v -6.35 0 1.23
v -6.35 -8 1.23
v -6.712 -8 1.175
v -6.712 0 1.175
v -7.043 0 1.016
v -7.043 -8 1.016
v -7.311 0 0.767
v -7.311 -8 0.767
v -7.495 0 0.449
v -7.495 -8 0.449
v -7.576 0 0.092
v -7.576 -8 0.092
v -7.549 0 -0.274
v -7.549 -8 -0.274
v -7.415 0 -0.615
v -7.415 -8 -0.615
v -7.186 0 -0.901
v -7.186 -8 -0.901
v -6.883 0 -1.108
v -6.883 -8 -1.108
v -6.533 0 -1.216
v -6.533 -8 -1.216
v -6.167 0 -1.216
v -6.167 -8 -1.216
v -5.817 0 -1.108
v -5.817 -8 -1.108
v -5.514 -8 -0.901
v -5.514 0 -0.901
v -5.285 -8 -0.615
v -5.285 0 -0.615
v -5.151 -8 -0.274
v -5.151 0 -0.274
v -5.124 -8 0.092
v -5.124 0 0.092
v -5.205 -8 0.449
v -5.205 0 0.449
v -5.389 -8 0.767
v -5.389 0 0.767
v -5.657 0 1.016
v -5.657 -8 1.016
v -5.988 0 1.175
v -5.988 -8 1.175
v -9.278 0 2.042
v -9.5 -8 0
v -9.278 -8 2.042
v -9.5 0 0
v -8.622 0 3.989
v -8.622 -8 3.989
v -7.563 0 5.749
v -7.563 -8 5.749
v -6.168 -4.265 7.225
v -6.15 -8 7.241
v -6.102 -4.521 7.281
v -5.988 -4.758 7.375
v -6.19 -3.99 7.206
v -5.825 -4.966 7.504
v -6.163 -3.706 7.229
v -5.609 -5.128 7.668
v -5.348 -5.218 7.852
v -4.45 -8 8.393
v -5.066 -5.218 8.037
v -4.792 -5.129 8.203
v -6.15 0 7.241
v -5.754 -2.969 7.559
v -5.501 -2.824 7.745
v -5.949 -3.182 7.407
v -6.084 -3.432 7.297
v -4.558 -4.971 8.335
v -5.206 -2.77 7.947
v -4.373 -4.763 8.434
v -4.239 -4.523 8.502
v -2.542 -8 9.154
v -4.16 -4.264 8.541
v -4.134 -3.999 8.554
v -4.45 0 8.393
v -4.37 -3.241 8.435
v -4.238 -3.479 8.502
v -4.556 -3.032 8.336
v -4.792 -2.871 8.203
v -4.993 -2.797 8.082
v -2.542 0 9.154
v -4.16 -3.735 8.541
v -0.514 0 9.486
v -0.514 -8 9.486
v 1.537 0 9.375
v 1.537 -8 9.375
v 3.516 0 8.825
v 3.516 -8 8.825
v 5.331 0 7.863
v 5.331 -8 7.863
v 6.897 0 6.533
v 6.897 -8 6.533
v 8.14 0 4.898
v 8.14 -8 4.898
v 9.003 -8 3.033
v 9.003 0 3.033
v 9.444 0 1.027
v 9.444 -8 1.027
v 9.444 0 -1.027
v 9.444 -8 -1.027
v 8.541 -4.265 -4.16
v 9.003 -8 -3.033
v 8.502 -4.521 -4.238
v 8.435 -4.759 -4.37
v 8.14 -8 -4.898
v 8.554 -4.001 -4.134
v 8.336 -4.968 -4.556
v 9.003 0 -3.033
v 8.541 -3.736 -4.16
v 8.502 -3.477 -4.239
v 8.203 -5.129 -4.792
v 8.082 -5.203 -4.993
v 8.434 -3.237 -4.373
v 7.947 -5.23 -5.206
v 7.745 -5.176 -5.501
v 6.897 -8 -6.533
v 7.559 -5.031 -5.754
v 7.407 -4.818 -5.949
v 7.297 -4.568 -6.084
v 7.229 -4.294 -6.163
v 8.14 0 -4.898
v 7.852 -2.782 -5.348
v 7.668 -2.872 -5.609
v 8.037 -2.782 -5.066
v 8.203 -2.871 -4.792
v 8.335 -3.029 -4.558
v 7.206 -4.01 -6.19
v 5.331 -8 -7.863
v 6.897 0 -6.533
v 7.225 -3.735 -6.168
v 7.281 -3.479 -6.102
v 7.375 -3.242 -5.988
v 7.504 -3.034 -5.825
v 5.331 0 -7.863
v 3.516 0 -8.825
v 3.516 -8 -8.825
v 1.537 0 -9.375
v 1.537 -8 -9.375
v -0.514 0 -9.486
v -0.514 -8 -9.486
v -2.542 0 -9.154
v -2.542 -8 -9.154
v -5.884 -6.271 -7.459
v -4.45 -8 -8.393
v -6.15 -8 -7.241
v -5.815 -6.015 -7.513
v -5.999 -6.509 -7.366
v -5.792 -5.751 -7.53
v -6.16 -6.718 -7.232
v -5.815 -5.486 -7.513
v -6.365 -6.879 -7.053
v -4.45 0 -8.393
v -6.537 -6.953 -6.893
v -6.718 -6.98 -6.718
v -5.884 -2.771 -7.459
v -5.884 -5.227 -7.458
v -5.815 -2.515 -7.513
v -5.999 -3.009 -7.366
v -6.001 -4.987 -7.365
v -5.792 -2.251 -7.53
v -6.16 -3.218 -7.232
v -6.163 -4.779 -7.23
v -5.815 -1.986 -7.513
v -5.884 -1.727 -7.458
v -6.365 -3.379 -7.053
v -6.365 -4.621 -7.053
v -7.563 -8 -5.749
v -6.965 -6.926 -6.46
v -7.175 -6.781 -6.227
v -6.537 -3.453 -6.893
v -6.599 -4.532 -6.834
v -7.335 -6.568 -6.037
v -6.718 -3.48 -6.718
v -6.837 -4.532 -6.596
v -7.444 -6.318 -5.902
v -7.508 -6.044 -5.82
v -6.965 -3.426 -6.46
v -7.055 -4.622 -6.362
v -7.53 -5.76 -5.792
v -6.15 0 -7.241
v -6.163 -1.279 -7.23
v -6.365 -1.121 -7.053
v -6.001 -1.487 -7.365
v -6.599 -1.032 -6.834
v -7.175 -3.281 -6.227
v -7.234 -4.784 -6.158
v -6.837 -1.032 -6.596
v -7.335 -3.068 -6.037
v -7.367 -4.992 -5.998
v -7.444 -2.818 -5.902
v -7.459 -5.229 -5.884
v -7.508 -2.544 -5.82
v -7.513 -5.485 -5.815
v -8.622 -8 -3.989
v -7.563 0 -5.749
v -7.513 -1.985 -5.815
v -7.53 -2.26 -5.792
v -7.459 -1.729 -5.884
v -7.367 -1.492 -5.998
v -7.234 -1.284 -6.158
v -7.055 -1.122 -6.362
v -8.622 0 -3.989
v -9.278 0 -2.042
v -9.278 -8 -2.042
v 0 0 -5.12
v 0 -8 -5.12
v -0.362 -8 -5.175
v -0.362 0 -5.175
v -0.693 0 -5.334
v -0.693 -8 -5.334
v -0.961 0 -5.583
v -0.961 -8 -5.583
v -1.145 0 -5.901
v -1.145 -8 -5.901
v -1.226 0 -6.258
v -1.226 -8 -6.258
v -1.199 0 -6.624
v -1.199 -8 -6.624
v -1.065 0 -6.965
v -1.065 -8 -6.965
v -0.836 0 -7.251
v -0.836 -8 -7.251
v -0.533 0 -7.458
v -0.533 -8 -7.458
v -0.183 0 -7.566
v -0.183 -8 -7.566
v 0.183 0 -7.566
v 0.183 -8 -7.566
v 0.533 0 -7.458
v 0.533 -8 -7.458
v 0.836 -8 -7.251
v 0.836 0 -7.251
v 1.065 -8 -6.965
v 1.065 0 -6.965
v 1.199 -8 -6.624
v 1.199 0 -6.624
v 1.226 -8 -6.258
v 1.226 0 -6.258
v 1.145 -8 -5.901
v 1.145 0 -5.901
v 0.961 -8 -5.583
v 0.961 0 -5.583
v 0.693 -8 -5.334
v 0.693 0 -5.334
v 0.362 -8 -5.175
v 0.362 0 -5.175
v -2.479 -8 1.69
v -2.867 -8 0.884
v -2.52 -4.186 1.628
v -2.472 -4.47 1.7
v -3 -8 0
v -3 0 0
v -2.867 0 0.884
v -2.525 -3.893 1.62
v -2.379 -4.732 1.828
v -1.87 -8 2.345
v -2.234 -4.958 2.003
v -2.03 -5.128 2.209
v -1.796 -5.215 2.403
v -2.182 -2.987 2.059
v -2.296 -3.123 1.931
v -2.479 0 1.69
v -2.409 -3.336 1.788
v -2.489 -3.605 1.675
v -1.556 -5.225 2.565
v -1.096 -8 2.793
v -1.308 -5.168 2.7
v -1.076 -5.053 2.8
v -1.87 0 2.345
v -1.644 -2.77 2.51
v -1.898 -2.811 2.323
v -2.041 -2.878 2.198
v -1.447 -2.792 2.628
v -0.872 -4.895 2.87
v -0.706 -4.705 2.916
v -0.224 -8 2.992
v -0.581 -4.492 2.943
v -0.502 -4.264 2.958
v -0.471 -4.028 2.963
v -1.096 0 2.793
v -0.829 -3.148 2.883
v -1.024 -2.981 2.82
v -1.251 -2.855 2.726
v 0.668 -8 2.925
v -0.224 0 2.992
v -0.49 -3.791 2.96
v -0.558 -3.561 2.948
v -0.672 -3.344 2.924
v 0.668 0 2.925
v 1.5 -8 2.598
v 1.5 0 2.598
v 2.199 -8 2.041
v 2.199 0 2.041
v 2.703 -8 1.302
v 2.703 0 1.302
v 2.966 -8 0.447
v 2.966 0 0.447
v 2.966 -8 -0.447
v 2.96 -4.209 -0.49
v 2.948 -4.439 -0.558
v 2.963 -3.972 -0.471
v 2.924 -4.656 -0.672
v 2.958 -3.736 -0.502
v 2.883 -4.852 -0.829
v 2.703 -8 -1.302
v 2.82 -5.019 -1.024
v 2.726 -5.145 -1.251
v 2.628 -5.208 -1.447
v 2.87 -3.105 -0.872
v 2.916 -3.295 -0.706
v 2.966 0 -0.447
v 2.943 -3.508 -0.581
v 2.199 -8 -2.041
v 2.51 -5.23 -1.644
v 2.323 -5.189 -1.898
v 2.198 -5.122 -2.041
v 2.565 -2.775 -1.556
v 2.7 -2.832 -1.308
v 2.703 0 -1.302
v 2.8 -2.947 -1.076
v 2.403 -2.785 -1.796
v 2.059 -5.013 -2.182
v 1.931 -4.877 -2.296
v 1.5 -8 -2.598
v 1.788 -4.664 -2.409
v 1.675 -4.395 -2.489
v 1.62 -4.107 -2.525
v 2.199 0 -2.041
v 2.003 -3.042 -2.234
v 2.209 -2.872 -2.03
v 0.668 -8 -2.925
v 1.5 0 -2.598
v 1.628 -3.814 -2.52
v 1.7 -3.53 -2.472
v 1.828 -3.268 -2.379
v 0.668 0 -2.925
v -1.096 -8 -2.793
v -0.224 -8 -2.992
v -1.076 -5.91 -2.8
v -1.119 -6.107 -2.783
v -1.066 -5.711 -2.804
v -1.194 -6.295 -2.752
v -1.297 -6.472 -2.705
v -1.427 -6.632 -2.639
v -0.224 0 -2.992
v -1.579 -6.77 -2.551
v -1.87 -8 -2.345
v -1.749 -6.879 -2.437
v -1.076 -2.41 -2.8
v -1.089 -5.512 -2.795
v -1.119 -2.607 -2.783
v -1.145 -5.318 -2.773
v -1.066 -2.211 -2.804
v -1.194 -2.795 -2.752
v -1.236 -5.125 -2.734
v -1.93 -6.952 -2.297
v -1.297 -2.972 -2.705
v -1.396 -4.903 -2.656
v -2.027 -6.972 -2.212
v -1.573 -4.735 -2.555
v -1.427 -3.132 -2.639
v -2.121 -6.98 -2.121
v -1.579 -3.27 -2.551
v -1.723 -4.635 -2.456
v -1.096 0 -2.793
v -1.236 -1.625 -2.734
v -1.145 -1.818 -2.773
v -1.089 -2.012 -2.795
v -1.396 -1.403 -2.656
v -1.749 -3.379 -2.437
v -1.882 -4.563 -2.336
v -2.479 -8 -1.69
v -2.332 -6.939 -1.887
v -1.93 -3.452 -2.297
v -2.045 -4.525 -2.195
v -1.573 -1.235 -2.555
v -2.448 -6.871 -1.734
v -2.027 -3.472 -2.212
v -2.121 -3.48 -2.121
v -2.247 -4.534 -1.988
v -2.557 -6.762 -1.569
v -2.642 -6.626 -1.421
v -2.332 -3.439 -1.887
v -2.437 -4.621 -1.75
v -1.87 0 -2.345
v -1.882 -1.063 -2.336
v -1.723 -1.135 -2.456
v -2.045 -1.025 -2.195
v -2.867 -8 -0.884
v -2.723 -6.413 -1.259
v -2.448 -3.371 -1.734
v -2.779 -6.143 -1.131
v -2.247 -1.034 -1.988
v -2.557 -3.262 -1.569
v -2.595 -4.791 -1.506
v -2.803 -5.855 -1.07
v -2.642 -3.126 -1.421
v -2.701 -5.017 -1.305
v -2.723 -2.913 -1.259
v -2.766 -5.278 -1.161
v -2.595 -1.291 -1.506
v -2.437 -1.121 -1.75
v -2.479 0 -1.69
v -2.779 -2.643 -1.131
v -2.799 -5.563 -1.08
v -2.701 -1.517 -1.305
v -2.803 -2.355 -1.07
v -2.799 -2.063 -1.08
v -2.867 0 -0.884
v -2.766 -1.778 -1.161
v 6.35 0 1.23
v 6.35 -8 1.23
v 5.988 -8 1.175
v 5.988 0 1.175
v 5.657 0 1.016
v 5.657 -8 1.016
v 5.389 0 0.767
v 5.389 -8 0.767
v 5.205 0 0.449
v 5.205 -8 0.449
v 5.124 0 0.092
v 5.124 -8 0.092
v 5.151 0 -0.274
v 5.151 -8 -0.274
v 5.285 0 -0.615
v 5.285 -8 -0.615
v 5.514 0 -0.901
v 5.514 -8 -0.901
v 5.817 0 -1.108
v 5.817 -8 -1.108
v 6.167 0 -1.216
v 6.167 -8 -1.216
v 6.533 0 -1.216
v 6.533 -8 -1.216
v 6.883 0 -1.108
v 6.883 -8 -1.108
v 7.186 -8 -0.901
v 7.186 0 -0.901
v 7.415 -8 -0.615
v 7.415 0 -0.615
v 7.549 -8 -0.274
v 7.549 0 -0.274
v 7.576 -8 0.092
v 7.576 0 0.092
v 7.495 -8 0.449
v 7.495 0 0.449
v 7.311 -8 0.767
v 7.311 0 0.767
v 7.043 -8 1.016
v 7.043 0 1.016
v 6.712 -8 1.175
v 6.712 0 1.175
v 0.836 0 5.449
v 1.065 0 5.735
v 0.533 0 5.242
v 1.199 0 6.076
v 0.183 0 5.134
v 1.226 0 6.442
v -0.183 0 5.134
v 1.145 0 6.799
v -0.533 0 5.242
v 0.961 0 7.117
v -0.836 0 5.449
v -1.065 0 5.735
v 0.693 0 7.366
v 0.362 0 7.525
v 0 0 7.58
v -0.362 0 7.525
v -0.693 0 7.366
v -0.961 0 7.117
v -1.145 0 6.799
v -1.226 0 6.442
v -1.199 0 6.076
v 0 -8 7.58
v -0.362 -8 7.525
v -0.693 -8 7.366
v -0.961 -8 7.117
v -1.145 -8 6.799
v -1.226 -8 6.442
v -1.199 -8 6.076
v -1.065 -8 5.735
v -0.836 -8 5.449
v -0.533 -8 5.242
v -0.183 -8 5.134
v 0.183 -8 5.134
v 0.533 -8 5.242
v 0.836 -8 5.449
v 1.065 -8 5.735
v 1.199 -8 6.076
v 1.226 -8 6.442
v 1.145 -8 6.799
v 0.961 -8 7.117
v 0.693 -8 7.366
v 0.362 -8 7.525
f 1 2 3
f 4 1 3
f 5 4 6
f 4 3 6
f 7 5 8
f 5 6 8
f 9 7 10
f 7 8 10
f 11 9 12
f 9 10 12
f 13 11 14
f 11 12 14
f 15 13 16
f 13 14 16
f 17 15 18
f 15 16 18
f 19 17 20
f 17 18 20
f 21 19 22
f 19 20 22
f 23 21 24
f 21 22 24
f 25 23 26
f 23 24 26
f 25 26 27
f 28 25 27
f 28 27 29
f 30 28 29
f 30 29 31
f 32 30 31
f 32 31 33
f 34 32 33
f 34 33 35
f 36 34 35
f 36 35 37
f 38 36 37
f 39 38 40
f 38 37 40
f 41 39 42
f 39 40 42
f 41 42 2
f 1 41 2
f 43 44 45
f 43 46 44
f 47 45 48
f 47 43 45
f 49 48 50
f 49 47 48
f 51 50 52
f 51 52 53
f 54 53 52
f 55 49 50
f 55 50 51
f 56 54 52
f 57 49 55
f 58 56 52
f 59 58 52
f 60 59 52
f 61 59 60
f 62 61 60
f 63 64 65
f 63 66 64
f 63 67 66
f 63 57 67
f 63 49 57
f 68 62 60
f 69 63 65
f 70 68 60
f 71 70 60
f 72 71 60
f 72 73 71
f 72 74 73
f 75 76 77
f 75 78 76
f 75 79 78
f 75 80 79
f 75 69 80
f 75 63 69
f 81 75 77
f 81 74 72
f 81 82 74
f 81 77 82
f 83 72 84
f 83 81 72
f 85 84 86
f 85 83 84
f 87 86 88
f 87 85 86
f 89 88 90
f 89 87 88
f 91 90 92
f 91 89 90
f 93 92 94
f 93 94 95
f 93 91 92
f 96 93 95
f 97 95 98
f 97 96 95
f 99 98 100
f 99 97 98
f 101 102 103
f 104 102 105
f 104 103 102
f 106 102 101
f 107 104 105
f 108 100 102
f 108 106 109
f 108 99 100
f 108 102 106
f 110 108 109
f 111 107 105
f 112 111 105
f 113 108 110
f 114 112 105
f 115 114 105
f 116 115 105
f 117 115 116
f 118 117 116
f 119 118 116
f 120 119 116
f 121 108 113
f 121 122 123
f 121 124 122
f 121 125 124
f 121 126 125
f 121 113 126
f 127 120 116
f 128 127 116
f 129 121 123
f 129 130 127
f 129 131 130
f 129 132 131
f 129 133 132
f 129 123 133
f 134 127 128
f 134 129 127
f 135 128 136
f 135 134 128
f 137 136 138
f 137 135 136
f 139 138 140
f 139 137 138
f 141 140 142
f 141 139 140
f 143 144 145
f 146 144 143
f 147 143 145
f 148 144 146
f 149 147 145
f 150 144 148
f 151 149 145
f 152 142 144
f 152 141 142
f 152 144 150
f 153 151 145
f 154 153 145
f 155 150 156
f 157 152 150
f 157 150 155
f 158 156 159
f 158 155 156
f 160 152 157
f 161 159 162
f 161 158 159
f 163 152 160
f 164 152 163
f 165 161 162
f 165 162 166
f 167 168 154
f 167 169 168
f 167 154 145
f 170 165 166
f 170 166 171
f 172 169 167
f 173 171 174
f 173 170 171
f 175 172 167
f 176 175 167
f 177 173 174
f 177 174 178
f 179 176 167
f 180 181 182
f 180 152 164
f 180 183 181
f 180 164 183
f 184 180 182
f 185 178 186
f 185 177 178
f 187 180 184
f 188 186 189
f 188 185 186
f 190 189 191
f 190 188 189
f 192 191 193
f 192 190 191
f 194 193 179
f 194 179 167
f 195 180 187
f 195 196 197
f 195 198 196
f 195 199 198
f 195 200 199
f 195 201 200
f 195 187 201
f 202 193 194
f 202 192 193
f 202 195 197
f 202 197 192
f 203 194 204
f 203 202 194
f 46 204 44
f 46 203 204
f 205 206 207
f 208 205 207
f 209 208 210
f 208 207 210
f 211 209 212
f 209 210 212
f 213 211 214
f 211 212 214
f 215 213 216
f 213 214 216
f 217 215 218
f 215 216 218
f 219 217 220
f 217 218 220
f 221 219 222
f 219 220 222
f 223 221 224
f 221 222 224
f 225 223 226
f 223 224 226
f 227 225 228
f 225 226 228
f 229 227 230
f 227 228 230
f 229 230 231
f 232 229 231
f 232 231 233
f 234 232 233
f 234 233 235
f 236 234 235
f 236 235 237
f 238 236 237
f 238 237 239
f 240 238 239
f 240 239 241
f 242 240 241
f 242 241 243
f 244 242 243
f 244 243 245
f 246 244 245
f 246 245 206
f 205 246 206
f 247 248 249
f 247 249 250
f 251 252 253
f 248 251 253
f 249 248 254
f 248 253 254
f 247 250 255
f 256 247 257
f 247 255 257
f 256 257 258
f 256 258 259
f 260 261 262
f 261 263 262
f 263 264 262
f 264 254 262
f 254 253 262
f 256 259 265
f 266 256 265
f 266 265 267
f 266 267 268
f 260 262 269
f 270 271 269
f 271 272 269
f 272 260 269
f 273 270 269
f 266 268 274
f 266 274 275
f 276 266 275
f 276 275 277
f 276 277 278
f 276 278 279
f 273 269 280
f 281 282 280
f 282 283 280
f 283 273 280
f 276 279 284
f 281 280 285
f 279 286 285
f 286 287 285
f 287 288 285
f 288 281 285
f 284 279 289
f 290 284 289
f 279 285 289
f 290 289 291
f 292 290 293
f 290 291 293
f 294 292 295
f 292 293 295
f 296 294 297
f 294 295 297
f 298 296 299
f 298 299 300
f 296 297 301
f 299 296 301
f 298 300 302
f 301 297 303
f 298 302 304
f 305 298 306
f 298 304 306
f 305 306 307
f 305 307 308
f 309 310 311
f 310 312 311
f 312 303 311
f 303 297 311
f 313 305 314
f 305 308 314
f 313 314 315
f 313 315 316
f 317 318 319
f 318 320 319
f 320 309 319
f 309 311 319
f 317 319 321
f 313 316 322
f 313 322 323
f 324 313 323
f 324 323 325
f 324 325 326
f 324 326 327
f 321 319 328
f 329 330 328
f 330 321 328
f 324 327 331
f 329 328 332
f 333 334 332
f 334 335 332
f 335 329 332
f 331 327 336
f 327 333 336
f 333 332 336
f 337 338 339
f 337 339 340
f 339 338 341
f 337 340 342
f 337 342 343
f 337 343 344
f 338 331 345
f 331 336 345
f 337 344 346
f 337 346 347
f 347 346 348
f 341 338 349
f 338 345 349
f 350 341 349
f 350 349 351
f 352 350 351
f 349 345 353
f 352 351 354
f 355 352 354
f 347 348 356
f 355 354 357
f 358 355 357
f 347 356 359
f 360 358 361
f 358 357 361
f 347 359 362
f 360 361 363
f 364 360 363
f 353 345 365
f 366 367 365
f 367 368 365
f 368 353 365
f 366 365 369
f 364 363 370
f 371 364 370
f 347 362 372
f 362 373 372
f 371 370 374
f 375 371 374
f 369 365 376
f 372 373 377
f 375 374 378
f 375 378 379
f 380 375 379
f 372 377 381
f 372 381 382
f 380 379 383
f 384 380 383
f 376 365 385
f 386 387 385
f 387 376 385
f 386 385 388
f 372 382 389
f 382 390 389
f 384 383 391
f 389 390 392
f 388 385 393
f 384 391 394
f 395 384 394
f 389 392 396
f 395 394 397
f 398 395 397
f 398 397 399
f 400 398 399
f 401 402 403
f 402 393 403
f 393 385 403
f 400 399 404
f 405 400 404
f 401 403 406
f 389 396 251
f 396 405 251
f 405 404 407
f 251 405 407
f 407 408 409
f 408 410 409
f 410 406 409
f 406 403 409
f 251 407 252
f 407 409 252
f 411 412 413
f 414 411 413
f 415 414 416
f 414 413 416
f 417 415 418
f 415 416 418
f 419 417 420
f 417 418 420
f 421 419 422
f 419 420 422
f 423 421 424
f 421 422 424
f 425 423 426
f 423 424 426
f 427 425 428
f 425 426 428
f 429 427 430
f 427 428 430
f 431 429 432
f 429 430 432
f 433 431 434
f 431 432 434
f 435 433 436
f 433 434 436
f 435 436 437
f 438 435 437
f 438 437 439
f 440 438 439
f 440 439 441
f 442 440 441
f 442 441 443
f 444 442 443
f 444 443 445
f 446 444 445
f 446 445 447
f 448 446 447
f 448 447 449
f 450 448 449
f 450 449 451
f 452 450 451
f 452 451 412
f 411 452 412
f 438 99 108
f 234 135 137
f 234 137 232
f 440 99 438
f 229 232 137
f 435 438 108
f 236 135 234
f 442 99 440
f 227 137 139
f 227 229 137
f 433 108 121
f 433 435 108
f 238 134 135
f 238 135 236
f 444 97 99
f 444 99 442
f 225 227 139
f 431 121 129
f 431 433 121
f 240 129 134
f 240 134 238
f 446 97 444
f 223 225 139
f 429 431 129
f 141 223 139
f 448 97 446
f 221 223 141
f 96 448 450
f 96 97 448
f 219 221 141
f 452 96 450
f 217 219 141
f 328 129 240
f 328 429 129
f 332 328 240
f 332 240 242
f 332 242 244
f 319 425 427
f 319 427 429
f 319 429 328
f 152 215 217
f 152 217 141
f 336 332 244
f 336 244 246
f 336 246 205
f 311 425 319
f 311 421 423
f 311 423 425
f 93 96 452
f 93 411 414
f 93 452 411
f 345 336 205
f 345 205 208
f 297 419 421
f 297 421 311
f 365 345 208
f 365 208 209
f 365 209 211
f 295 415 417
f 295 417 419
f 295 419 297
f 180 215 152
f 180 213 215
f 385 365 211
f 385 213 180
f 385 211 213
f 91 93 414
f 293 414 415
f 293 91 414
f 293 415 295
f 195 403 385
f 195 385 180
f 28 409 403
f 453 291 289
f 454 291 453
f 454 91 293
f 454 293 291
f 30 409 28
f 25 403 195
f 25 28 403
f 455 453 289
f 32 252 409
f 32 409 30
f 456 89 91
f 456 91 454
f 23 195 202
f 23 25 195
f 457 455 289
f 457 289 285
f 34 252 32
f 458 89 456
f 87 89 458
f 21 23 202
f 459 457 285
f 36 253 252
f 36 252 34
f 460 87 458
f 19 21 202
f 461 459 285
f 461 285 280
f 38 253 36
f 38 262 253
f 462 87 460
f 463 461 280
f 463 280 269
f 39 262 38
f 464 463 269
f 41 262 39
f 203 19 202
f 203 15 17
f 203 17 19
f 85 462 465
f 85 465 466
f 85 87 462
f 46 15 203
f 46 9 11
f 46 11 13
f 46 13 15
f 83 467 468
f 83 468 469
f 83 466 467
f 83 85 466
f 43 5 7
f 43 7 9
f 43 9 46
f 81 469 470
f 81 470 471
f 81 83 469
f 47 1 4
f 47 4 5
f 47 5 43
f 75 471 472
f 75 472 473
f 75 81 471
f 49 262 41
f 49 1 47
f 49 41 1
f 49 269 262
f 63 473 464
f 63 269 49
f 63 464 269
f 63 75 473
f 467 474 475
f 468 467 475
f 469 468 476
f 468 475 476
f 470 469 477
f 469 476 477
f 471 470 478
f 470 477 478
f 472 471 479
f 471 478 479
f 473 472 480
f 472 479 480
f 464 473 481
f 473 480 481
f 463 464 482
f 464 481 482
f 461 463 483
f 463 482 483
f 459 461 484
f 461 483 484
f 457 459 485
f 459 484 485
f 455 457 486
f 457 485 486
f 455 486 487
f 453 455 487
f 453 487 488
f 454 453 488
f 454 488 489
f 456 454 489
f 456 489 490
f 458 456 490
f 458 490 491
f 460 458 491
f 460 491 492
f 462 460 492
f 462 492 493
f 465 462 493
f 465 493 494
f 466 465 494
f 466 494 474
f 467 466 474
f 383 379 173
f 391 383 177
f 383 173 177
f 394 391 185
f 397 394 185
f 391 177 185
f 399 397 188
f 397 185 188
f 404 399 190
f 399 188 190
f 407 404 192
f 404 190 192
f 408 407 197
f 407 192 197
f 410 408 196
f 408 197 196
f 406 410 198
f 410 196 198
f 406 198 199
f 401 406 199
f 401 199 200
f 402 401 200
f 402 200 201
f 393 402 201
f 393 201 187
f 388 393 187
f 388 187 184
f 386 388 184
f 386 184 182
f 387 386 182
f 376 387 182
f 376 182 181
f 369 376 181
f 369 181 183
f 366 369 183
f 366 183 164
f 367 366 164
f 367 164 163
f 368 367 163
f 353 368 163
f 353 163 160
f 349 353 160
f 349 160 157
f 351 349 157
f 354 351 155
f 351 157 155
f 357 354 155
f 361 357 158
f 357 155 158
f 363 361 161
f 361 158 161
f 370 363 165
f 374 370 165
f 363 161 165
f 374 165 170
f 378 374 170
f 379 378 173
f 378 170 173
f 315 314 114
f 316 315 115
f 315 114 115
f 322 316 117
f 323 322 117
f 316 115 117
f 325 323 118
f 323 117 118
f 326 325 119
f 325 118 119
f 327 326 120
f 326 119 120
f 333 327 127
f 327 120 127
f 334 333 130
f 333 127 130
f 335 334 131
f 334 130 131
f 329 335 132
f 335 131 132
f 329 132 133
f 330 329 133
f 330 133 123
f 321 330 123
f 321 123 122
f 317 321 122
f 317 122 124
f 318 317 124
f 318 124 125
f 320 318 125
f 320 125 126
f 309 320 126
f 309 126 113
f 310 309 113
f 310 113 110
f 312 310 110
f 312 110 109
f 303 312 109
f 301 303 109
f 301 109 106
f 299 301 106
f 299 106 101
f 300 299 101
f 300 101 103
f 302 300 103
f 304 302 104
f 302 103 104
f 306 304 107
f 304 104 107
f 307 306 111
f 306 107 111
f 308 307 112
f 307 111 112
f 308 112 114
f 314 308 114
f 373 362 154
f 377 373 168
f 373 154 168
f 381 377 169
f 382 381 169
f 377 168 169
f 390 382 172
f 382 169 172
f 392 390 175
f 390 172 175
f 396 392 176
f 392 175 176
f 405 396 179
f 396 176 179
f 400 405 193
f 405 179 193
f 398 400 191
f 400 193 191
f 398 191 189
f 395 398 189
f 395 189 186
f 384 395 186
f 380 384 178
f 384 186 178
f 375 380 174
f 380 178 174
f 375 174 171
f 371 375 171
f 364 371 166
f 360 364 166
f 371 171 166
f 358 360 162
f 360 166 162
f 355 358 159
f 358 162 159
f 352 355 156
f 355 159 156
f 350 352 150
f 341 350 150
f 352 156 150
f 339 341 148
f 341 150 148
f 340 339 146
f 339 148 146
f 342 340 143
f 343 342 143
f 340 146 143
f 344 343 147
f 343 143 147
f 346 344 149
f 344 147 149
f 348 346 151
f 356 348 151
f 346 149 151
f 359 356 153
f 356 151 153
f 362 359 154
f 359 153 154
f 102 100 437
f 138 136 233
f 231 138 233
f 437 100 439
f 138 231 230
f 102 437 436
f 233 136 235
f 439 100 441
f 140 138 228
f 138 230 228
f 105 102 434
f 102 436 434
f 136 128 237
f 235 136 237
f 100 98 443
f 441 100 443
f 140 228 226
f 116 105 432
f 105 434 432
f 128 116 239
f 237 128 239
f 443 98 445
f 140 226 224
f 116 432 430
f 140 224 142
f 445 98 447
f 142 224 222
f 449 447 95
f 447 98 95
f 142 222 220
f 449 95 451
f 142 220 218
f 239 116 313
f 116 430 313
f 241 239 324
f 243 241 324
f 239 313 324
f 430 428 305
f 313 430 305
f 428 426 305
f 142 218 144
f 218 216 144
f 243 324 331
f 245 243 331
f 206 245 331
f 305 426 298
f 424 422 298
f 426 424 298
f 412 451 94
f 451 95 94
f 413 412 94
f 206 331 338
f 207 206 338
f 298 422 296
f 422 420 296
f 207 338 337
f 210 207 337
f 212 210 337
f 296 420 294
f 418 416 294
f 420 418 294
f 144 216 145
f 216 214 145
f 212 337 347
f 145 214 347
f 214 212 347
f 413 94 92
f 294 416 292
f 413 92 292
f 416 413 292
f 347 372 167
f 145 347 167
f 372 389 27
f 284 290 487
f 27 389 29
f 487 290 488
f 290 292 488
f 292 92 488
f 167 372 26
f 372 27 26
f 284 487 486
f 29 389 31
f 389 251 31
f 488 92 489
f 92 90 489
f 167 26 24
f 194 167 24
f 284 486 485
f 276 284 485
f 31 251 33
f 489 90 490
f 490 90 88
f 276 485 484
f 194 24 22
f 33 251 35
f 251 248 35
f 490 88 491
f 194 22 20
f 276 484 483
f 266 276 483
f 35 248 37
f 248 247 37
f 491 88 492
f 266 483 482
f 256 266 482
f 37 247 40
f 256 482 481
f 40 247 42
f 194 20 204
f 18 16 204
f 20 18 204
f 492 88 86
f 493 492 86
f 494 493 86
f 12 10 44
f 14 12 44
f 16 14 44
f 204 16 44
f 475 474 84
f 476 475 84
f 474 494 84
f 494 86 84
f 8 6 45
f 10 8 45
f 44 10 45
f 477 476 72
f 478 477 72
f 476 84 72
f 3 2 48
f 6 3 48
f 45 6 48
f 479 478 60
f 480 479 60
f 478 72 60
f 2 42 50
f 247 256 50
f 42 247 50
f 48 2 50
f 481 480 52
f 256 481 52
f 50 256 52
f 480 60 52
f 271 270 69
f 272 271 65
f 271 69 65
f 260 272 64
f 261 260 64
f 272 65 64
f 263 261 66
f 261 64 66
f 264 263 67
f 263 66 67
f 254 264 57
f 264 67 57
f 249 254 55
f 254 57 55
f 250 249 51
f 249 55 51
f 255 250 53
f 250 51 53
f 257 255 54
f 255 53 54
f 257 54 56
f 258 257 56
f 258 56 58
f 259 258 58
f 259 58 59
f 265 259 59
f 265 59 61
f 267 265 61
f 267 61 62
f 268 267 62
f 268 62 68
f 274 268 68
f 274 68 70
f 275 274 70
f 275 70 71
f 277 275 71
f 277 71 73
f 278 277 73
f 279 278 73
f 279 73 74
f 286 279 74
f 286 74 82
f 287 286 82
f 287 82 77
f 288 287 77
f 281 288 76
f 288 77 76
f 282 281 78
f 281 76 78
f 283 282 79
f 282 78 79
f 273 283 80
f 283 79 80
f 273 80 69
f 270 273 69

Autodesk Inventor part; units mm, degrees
sketch "Sketch1" plane through (0, 0, 0) normal (0, 1, 0) x (-1, 0, 0)
  circle A0 centre (0, 0) radius 15 construction
  circle A1 centre (0, 0) radius 9.5
  circle A2 centre (0, 0) radius 3
  circle A3 centre (0, 0) radius 6.35 construction
  circle A4 centre (6.35, 0) radius 3 construction
  line L0 (6.35, 0) -> (0, 0) construction
  circle A5 centre (6.35, 0) radius 2.5 construction
  circle A6 centre (0, 6.35) radius 2.5 construction
  circle A7 centre (0, 6.35) radius 3 construction
  circle A8 centre (-6.35, 0) radius 2.5 construction
  circle A9 centre (-6.35, 0) radius 3 construction
  circle A10 centre (0, -6.35) radius 2.5 construction
  circle A11 centre (0, -6.35) radius 3 construction
  point P0 (-1.9685, -4.5962)
  point P1 (-3.7402, -8.7328)
  point P2 (-4.5962, -1.9685)
  point P3 (-8.7328, -3.7402)
  point P4 (-4.5962, 1.9685)
  point P5 (-8.7328, 3.7402)
  point P6 (-1.9685, 4.5962)
  point P7 (-3.7402, 8.7328)
  point P8 (3.7402, 8.7328)
  point P9 (1.9685, 4.5962)
  point P10 (4.5962, 1.9685)
  point P11 (8.7328, 3.7402)
  point P12 (4.5962, -1.9685)
  point P13 (8.7328, -3.7402)
  point P14 (1.9685, -4.5962)
  point P15 (3.7402, -8.7328)
  dimension "d2" = 19
  dimension "d4" = 12.7
  dimension "d0" = 30
  dimension "d1" = 5.5
  dimension "d3" = 6
  dimension "d5" = 6
  dimension "d6" = 5
  dimension "d9" = 360
extrude "Extrusion1" add sketch "Sketch1" against normal blind 1
extrude "Extrusion2" add sketch "Sketch1" against normal blind 8
hole "Hole1" at (-6.35, 0, 0) at (0, 0, -6.35) at (6.35, 0, 0) at (0, 0, 6.35) direction (0, -1, 0) diameter 2.459 depth 20 thread size "M3x0.5" class "6H" standard "ISO Metric profile"
ref_plane "Work Plane4" through (0, 0, 0) normal (0.7071, 0, 0.7071) x (0, 1, 0)
sketch "Sketch8" plane through (0, 0, 0) normal (0.7071, 0, 0.7071) x (0, 1, 0)
  line L0 (-8, -3) -> (-8, 3) construction
  line L1 (0, 3) -> (0, -3) construction
  line L2 (-8, -3) -> (0, -3) construction
  line L3 (-8, 3) -> (0, 3) construction
  line L4 (0, 0) -> (-8, 0) construction
  circle A0 centre (-2.25, 0) radius 1.25
  circle A1 centre (-5.75, 0) radius 1.25
  dimension "d92" = 2.5
  dimension "d93" = 2.5
  dimension "d94" = 1
  dimension "d95" = 1
  dimension "d96" = 1
hole "Hole9" at (0, -2.25, 0) at (0, -5.75, 0) direction (-0.7071, 0, -0.7071) diameter 2.459 depth 20 thread size "M3x0.5" class "6H" standard "ISO Metric profile"
sketch "Sketch9" plane through (0, 0, 0) normal (0, 1, 0) x (1, 0, 0)
  circle A0 centre (0, -6.35) radius 1.2295 projected
  circle A1 centre (6.35, 0) radius 1.2295 projected
  circle A2 centre (0, 6.35) radius 1.2295 projected
  circle A3 centre (-6.35, 0) radius 1.2295 projected
  circle A4 centre (0, 0) radius 9.5 projected
  circle A5 centre (0, 0) radius 3 projected
  line L0 (0, 0) -> (7.9468, 5.2056) construction
  line L1 (0, 0) -> (-5.2056, -7.9468) construction
  circle A6 centre (0, 0) radius 3 projected
  line L2 (2.9663, 0.4487) -> (8.5627, 4.1147)
  line L3 (1.5964, 2.54) -> (7.1928, 6.2059)
  line L4 (-2.54, -1.5964) -> (-6.2059, -7.1928)
  line L5 (-4.1147, -8.5627) -> (-0.4487, -2.9663)
  line L6 (1.5964, 2.54) -> (2.9663, 0.4487)
  line L7 (-0.4487, -2.9663) -> (-2.54, -1.5964)
  dimension "d97" = 1.25
  dimension "d98" = 1.25
  dimension "d99" = 1.25
  dimension "d100" = 1.25
  dimension "d101" = 1
  dimension "d102" = 1
ref_plane "Work Plane5" through (1.5964, 0, -2.54) normal (0.8365, 0, -0.548) x (0.548, 0, 0.8365)
ref_plane "Work Plane6" through (-0.4487, 0, 2.9663) normal (-0.548, 0, 0.8365) x (-0.8365, 0, -0.548)
sketch "Sketch10" plane through (1.5964, 0, -2.54) normal (0.8365, 0, -0.548) x (0.548, 0, 0.8365)
  line L0 (-1.75, 8) -> (4.25, 8) projected
  line L1 (4.25, 0) -> (-1.75, 0) projected
  line L2 (4.25, 0) -> (-1.75, 0) projected
  line L3 (4.25, 0) -> (-1.75, 8)
  line L4 (-1.75, 8) -> (4.25, 8) projected
  line L5 (4.25, 8) -> (-1.75, 0)
  point P0 (1.25, 0)
  point P1 (-1.178, 5.75)
  point P2 (-1.178, 2.25)
  point P3 (1.25, 4)
hole "Hole10" at (2.2813, -4, -1.4944) direction (0.8365, 0, -0.548) diameter 2.459 depth 20 thread size "M3x0.5" class "6H" standard "ISO Metric profile"
sketch "Sketch11" plane through (-0.4487, 0, 2.9663) normal (-0.548, 0, 0.8365) x (-0.8365, 0, -0.548)
  line L0 (-1.75, 8) -> (4.25, 8) construction
  line L1 (4.25, 0) -> (-1.75, 0) construction
  line L2 (4.25, 0) -> (-1.75, 8) construction
  line L3 (4.25, 8) -> (-1.75, 0) construction
  point P0 (1.25, 0)
  point P1 (-0.9703, 4)
  point P2 (4.1798, 5.75)
  point P3 (4.1798, 2.25)
  point P4 (1.25, 4)
hole "Hole11" at (-1.4944, -4, 2.2813) direction (-0.548, 0, 0.8365) diameter 2.459 depth 20 thread size "M3x0.5" class "6H" standard "ISO Metric profile"
equation "\"d93\" = d92"
equation "\"d94\" = d96"
equation "\"d95\" = d96"
equation "\"d98\" = d97"
equation "\"d99\" = d97"
equation "\"d100\" = d97"
equation "\"d102\" = d101"
properties part number "DiyHub" material "Steel, Alloy"
